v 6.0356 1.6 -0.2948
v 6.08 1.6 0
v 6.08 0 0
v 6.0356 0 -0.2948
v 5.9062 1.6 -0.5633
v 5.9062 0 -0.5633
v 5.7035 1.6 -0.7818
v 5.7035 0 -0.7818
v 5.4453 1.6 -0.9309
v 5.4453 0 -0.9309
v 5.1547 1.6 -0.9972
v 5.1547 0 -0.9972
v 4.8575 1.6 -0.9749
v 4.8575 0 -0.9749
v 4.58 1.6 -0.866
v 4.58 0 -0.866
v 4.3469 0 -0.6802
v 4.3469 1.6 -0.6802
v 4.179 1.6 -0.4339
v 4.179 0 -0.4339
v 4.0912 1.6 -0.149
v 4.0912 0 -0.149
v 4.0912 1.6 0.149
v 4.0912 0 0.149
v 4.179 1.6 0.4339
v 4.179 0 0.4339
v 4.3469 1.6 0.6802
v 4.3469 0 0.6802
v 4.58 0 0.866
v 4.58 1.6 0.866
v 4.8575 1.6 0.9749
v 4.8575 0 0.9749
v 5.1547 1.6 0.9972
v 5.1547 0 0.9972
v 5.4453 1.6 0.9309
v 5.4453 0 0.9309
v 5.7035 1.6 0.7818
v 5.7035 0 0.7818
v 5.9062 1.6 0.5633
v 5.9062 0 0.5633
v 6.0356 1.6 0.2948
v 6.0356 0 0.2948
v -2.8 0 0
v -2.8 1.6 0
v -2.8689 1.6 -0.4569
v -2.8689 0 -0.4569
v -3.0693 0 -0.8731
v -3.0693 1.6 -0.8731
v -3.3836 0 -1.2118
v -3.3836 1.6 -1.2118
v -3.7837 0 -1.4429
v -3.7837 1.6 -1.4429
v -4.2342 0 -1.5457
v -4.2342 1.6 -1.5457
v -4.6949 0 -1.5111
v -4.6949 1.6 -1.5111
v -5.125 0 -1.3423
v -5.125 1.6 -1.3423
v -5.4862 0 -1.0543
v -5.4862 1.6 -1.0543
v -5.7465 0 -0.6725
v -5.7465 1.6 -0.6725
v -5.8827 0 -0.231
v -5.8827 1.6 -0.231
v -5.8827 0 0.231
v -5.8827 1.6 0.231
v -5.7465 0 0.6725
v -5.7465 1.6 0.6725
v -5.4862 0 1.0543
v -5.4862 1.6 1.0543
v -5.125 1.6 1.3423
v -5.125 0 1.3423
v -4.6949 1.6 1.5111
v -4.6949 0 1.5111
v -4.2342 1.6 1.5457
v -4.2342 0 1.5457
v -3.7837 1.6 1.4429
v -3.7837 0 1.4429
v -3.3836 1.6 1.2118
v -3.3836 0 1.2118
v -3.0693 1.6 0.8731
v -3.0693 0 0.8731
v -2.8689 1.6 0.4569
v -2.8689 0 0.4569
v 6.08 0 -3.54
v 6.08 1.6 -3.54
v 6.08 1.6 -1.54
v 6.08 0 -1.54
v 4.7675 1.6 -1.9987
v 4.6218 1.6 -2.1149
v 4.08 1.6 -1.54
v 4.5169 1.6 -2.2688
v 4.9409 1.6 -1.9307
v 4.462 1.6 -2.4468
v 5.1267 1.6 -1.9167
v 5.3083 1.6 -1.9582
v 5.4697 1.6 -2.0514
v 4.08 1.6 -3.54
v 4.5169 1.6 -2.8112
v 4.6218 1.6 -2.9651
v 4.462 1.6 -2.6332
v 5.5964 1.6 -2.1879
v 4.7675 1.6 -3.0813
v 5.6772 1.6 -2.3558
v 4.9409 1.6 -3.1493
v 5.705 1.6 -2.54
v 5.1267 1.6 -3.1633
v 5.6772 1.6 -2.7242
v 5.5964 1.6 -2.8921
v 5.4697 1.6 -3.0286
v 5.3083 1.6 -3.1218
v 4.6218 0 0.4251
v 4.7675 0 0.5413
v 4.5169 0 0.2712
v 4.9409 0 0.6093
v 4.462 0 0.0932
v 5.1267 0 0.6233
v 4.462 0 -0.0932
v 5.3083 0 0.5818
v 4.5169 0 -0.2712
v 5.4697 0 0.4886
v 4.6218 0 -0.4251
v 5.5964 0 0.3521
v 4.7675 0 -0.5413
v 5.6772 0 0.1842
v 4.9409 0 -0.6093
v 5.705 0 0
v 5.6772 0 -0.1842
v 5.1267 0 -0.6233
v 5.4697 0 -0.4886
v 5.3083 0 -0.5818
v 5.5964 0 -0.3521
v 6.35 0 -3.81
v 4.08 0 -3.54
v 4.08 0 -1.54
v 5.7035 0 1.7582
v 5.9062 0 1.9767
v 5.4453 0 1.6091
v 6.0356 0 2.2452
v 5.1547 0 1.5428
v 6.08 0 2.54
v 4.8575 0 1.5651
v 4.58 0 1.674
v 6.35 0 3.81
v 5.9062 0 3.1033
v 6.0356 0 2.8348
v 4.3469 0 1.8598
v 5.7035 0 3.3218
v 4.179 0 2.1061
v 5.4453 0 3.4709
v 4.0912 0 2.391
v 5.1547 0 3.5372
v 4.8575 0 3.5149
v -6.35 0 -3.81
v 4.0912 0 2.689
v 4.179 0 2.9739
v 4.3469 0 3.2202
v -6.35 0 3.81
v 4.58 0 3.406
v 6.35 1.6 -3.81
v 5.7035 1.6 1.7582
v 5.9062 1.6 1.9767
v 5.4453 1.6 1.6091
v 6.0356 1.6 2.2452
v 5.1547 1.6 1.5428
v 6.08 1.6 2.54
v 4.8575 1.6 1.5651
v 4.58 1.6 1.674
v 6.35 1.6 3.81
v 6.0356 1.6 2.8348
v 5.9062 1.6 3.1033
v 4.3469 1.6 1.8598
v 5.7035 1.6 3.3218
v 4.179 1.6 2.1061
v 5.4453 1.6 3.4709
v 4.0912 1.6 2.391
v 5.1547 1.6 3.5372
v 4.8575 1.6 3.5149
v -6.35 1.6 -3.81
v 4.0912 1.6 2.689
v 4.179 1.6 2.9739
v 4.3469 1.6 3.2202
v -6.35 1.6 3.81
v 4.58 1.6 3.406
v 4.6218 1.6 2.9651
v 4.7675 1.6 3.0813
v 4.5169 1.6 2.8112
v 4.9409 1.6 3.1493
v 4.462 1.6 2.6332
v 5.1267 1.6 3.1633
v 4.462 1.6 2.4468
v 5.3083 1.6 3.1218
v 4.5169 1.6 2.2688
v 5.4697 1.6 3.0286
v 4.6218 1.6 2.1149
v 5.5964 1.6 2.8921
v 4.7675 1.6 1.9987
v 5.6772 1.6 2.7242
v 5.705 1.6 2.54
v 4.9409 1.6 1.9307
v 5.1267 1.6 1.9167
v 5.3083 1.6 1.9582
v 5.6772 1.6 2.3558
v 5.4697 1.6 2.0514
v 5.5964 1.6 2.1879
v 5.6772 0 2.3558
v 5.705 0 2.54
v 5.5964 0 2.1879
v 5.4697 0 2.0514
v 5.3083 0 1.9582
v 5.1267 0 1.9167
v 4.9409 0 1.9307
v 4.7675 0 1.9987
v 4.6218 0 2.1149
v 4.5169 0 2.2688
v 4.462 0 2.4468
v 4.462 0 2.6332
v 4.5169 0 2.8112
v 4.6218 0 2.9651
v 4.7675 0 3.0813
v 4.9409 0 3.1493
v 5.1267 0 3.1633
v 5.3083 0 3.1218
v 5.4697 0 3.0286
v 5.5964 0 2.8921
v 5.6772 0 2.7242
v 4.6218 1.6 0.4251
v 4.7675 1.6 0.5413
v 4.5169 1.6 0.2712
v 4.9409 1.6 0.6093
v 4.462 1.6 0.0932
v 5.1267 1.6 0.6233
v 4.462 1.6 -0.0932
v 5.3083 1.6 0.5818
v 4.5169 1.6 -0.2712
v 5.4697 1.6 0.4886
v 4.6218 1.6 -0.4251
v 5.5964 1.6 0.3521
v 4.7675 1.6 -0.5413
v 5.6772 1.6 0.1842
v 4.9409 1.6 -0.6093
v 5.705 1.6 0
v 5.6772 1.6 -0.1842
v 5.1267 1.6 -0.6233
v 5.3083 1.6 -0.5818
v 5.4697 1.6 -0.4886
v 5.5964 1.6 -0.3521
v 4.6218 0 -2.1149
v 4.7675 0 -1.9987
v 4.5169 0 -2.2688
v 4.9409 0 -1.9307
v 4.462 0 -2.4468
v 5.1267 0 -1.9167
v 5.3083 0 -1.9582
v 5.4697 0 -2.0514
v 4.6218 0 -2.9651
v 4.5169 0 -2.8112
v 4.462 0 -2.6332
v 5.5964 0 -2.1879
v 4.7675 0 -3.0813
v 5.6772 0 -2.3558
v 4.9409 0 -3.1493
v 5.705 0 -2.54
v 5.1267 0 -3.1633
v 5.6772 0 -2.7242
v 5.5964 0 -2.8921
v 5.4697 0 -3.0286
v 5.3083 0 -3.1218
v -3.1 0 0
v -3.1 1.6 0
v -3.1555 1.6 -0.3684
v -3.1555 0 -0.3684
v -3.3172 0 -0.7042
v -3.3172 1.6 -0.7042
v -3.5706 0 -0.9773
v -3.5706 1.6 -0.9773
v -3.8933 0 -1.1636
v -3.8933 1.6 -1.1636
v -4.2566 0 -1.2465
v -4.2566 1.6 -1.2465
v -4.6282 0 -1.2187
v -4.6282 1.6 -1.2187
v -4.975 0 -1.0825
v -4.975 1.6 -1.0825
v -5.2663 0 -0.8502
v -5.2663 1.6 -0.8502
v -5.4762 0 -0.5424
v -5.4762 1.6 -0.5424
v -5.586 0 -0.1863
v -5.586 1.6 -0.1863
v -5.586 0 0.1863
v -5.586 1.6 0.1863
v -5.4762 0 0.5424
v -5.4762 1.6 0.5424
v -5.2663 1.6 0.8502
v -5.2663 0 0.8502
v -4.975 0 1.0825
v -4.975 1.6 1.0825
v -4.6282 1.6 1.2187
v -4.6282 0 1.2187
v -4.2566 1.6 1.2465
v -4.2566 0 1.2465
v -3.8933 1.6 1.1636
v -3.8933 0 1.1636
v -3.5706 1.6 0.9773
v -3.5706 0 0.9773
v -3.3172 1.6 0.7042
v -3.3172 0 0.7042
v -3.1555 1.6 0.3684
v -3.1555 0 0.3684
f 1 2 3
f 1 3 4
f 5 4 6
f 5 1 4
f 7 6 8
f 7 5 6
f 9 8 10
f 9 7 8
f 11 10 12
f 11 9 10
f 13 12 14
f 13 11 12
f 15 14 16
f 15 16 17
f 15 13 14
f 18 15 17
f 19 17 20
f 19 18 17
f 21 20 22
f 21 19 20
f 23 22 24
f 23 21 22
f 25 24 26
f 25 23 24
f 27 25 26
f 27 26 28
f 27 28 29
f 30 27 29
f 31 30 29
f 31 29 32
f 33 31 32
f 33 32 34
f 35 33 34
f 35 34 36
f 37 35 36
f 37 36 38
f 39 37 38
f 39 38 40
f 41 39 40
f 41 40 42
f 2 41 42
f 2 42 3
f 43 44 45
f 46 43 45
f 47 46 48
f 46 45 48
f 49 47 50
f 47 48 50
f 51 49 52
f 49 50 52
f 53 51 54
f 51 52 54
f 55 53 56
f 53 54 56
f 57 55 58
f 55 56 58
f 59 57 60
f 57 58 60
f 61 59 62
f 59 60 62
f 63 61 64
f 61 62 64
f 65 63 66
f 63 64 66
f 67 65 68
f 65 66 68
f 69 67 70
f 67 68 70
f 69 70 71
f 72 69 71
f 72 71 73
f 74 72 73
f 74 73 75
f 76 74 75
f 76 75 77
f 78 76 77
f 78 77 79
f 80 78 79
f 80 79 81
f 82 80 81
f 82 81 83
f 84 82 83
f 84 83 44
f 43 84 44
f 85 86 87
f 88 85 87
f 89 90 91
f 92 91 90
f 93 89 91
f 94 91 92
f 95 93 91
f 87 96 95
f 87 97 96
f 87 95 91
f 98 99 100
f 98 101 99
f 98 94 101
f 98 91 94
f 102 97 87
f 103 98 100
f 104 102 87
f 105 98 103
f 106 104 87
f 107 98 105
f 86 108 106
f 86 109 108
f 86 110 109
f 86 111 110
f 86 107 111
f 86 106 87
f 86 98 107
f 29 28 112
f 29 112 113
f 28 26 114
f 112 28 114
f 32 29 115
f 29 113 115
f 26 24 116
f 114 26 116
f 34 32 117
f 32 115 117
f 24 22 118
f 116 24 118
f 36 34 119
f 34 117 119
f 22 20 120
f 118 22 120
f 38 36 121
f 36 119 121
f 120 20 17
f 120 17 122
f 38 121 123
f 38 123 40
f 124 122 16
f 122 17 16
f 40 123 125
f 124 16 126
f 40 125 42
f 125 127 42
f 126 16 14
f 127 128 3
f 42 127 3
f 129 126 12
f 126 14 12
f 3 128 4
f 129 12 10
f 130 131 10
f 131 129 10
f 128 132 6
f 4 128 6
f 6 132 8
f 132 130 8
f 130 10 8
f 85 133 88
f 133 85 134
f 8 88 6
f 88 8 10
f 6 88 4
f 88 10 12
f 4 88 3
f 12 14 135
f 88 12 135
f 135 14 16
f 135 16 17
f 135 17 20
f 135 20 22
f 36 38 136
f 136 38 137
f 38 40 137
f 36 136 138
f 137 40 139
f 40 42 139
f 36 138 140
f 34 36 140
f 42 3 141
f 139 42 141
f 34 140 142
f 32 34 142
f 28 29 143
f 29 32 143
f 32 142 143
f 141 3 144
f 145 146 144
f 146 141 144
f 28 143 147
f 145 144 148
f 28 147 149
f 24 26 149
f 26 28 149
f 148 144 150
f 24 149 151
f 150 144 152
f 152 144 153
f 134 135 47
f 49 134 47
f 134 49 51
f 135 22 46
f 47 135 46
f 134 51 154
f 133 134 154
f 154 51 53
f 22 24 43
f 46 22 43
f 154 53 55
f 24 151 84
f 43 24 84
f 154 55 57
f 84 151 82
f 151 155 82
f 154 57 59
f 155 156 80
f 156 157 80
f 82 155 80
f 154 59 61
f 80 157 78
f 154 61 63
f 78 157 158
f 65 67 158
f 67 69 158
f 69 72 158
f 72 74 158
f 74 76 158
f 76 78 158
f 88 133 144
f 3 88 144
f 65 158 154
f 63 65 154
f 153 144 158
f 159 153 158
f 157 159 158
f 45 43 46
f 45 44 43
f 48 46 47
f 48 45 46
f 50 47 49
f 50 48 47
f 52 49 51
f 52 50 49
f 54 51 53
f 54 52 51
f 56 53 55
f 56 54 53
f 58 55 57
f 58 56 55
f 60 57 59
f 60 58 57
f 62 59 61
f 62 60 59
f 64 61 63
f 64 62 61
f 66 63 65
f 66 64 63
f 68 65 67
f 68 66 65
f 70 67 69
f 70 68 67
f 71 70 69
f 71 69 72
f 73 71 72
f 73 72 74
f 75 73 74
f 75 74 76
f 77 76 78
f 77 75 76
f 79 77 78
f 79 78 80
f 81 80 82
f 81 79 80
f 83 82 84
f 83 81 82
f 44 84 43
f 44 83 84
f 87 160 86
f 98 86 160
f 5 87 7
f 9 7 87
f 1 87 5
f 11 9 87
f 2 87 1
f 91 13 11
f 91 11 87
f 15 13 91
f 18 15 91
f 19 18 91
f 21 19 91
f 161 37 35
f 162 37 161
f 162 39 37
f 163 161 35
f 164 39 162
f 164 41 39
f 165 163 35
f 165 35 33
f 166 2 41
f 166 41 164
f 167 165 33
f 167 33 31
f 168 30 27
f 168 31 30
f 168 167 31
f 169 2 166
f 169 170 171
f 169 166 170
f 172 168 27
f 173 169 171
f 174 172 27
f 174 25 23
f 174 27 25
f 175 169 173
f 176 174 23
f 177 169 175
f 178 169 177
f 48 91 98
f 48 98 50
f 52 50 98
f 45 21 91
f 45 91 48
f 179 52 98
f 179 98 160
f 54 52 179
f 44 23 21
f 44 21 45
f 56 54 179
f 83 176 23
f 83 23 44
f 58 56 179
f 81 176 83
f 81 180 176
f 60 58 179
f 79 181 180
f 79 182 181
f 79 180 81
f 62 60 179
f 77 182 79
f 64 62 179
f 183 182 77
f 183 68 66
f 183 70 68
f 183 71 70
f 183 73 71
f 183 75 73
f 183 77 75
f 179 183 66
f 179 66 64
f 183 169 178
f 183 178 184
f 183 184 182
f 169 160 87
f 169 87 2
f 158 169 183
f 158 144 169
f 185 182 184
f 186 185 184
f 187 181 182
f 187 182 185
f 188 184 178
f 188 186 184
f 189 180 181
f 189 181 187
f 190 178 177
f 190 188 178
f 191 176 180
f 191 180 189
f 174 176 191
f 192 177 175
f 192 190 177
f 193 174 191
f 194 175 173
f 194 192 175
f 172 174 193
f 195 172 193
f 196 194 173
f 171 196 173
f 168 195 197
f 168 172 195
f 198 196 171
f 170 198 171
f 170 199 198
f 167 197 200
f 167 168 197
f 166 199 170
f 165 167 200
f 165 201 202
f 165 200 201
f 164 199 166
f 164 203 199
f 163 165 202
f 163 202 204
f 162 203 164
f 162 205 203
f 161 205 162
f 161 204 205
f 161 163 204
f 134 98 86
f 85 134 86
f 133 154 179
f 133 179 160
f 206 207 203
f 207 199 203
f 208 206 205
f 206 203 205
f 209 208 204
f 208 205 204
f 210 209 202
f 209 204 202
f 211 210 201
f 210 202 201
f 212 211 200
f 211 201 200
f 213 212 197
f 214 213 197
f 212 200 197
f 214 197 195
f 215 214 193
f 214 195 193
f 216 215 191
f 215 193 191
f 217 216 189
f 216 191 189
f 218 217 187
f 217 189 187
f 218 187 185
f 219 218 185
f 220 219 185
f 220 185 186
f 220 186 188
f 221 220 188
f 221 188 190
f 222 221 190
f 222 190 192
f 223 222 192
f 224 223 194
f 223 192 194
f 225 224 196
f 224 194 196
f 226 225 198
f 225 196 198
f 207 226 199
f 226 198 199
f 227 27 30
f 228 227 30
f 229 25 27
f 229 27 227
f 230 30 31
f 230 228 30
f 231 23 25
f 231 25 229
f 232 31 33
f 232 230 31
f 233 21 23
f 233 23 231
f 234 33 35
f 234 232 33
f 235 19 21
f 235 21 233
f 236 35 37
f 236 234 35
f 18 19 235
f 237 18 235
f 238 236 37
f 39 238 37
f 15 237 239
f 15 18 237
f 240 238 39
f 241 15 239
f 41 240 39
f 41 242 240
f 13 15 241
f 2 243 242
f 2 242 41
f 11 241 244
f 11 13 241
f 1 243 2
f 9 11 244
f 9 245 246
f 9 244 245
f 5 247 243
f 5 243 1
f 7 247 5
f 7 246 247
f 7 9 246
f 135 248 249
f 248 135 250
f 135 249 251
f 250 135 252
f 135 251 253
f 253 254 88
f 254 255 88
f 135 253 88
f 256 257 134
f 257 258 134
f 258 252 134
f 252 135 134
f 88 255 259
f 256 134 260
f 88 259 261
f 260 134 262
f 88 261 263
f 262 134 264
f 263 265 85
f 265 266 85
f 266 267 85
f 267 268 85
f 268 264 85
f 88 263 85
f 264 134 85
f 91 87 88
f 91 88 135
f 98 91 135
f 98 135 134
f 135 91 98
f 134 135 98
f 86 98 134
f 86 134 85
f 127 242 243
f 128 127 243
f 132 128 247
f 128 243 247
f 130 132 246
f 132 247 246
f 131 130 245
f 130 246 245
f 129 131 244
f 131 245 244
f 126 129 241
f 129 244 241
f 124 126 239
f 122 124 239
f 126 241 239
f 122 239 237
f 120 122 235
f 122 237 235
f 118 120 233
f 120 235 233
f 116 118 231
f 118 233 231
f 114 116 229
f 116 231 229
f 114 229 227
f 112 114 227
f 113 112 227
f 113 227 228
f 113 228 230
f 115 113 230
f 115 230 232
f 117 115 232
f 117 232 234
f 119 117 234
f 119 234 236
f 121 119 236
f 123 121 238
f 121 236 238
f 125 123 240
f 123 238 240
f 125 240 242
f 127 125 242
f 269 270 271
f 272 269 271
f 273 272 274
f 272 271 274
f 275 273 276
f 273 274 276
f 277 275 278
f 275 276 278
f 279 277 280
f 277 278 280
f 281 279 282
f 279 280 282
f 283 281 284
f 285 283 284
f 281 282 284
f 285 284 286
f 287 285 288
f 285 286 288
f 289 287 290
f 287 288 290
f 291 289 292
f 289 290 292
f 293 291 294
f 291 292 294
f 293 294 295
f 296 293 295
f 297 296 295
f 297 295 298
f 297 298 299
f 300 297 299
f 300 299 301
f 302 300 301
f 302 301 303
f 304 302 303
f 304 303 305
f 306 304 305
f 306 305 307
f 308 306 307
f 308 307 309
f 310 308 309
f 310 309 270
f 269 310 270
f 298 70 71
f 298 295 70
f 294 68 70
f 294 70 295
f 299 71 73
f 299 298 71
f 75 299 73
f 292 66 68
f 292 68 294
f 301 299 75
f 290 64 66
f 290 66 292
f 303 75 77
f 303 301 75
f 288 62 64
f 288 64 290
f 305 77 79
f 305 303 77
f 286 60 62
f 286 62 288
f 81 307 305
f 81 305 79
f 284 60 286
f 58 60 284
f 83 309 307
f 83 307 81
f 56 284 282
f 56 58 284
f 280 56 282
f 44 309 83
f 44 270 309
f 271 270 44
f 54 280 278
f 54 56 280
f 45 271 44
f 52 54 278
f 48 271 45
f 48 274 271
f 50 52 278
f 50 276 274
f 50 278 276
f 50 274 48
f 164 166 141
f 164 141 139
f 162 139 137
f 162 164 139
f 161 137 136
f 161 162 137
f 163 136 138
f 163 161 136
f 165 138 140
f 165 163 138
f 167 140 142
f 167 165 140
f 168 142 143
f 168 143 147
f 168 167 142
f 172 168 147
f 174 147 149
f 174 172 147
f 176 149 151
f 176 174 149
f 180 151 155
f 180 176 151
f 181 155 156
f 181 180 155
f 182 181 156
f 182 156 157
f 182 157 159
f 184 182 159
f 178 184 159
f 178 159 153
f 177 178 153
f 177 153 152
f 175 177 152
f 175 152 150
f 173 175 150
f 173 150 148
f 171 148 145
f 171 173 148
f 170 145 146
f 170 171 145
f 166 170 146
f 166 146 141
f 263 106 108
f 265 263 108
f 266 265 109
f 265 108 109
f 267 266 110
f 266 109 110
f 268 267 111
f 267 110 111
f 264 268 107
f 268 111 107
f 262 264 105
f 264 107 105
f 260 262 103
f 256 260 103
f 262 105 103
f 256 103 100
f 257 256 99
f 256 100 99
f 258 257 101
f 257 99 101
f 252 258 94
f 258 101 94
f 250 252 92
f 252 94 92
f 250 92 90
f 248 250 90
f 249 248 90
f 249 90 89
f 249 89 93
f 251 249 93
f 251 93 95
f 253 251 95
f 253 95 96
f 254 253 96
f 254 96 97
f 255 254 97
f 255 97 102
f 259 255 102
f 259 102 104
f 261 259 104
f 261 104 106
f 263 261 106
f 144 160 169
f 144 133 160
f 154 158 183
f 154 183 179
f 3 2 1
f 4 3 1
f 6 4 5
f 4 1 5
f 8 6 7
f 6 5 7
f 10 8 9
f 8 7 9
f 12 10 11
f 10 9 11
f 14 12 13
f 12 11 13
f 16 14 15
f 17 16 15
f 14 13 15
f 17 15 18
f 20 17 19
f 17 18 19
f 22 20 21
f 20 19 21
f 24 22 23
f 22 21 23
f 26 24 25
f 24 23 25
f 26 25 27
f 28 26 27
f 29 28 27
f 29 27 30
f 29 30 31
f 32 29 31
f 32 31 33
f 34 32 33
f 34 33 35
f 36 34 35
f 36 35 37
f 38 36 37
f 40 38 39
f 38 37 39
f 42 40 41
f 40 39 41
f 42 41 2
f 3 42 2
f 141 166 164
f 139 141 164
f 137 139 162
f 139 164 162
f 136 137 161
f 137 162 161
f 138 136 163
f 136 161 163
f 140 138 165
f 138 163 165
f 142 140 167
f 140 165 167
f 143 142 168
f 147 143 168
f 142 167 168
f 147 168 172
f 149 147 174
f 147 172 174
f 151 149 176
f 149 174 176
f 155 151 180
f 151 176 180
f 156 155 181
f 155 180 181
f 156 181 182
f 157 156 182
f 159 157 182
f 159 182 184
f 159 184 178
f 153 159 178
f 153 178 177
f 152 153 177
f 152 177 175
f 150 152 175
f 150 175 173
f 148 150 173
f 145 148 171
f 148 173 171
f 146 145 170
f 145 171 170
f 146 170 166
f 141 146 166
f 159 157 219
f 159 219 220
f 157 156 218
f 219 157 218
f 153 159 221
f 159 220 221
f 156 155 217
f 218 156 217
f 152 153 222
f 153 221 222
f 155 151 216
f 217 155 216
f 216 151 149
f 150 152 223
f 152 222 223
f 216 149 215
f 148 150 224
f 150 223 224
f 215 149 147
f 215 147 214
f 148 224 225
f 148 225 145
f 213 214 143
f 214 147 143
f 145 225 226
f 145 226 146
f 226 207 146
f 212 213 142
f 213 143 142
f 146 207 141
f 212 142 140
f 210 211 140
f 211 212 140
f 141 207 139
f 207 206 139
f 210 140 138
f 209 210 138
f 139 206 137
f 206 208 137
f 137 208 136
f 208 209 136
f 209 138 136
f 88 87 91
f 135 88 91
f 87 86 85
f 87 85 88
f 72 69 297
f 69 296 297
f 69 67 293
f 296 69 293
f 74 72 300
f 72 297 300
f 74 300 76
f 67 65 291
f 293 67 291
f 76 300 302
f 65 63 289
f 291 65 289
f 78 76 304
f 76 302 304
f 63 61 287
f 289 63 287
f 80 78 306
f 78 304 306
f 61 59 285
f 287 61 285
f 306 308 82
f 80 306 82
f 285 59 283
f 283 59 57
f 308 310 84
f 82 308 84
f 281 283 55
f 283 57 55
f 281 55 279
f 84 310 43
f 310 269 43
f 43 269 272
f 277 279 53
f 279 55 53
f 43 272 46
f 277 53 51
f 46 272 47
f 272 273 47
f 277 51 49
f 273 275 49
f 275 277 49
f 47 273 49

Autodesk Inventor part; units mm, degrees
ref_plane "YZ Plane" through (0, 0, 0) normal (1, 0, 0) x (0, 1, 0)
ref_plane "XZ Plane" through (0, 0, 0) normal (0, 1, 0) x (-1, 0, 0)
ref_plane "XY Plane" through (0, 0, 0) normal (0, 0, 1) x (1, 0, 0)
sketch "Sketch1" plane through (0, 0, 0) normal (0, 1, 0) x (-1, 0, 0)
  line L0 (-6.35, 3.81) -> (6.35, 3.81)
  line L1 (6.35, 3.81) -> (6.35, -3.81)
  line L2 (6.35, -3.81) -> (-6.35, -3.81)
  line L3 (-6.35, -3.81) -> (-6.35, 3.81)
  line L4 (-6.35, 3.81) -> (6.35, -3.81) construction
  line L5 (6.35, 3.81) -> (-6.35, -3.81) construction
  point P0 (0, 0)
  dimension "d0" = 12.7
  dimension "d1" = 7.62
extrude "Extrusion1" add sketch "Sketch1" along normal blind 1.6
sketch "Sketch2" plane through (0, 1.6, 0) normal (0, 1, 0) x (1, 0, 0)
  circle A0 centre (-4.35, 0) radius 1.25
  circle A1 centre (-4.35, 0) radius 1.55
  circle A2 centre (5.08, 2.54) radius 0.625
  line L0 (4.08, 3.54) -> (6.08, 3.54)
  line L1 (6.08, 3.54) -> (6.08, 1.54)
  line L2 (6.08, 1.54) -> (4.08, 1.54)
  line L3 (4.08, 1.54) -> (4.08, 3.54)
  line L4 (4.08, 3.54) -> (6.08, 1.54) construction
  line L5 (6.08, 3.54) -> (4.08, 1.54) construction
  circle A3 centre (5.08, 0) radius 0.625
  circle A4 centre (5.08, 0) radius 1
  circle A5 centre (5.08, -2.54) radius 0.625
  circle A6 centre (5.08, -2.54) radius 1
  line L6 (0, 0) -> (2.2698, 0)
  line L7 (6.35, -3.81) -> (6.35, 3.81) projected
  line L8 (-6.35, 3.81) -> (-6.35, -3.81) projected
  dimension "d4" = 2.5
  dimension "d5" = 0.3
  dimension "d7" = 2
  dimension "d8" = 2.54
  dimension "d9" = 1.27
  dimension "d10" = 1.25
  dimension "d15" = 2
extrude "Extrusion2" cut sketch "Sketch2" against normal through all contours A0 | A1 | A2 | L0 L1 L2 L3 | A3 | A4 | A5 | A6
extrude "Extrusion3" add sketch "Sketch2" against normal up to surface (1.6 mm away) separate body
properties part number "QTR1A_Board"
